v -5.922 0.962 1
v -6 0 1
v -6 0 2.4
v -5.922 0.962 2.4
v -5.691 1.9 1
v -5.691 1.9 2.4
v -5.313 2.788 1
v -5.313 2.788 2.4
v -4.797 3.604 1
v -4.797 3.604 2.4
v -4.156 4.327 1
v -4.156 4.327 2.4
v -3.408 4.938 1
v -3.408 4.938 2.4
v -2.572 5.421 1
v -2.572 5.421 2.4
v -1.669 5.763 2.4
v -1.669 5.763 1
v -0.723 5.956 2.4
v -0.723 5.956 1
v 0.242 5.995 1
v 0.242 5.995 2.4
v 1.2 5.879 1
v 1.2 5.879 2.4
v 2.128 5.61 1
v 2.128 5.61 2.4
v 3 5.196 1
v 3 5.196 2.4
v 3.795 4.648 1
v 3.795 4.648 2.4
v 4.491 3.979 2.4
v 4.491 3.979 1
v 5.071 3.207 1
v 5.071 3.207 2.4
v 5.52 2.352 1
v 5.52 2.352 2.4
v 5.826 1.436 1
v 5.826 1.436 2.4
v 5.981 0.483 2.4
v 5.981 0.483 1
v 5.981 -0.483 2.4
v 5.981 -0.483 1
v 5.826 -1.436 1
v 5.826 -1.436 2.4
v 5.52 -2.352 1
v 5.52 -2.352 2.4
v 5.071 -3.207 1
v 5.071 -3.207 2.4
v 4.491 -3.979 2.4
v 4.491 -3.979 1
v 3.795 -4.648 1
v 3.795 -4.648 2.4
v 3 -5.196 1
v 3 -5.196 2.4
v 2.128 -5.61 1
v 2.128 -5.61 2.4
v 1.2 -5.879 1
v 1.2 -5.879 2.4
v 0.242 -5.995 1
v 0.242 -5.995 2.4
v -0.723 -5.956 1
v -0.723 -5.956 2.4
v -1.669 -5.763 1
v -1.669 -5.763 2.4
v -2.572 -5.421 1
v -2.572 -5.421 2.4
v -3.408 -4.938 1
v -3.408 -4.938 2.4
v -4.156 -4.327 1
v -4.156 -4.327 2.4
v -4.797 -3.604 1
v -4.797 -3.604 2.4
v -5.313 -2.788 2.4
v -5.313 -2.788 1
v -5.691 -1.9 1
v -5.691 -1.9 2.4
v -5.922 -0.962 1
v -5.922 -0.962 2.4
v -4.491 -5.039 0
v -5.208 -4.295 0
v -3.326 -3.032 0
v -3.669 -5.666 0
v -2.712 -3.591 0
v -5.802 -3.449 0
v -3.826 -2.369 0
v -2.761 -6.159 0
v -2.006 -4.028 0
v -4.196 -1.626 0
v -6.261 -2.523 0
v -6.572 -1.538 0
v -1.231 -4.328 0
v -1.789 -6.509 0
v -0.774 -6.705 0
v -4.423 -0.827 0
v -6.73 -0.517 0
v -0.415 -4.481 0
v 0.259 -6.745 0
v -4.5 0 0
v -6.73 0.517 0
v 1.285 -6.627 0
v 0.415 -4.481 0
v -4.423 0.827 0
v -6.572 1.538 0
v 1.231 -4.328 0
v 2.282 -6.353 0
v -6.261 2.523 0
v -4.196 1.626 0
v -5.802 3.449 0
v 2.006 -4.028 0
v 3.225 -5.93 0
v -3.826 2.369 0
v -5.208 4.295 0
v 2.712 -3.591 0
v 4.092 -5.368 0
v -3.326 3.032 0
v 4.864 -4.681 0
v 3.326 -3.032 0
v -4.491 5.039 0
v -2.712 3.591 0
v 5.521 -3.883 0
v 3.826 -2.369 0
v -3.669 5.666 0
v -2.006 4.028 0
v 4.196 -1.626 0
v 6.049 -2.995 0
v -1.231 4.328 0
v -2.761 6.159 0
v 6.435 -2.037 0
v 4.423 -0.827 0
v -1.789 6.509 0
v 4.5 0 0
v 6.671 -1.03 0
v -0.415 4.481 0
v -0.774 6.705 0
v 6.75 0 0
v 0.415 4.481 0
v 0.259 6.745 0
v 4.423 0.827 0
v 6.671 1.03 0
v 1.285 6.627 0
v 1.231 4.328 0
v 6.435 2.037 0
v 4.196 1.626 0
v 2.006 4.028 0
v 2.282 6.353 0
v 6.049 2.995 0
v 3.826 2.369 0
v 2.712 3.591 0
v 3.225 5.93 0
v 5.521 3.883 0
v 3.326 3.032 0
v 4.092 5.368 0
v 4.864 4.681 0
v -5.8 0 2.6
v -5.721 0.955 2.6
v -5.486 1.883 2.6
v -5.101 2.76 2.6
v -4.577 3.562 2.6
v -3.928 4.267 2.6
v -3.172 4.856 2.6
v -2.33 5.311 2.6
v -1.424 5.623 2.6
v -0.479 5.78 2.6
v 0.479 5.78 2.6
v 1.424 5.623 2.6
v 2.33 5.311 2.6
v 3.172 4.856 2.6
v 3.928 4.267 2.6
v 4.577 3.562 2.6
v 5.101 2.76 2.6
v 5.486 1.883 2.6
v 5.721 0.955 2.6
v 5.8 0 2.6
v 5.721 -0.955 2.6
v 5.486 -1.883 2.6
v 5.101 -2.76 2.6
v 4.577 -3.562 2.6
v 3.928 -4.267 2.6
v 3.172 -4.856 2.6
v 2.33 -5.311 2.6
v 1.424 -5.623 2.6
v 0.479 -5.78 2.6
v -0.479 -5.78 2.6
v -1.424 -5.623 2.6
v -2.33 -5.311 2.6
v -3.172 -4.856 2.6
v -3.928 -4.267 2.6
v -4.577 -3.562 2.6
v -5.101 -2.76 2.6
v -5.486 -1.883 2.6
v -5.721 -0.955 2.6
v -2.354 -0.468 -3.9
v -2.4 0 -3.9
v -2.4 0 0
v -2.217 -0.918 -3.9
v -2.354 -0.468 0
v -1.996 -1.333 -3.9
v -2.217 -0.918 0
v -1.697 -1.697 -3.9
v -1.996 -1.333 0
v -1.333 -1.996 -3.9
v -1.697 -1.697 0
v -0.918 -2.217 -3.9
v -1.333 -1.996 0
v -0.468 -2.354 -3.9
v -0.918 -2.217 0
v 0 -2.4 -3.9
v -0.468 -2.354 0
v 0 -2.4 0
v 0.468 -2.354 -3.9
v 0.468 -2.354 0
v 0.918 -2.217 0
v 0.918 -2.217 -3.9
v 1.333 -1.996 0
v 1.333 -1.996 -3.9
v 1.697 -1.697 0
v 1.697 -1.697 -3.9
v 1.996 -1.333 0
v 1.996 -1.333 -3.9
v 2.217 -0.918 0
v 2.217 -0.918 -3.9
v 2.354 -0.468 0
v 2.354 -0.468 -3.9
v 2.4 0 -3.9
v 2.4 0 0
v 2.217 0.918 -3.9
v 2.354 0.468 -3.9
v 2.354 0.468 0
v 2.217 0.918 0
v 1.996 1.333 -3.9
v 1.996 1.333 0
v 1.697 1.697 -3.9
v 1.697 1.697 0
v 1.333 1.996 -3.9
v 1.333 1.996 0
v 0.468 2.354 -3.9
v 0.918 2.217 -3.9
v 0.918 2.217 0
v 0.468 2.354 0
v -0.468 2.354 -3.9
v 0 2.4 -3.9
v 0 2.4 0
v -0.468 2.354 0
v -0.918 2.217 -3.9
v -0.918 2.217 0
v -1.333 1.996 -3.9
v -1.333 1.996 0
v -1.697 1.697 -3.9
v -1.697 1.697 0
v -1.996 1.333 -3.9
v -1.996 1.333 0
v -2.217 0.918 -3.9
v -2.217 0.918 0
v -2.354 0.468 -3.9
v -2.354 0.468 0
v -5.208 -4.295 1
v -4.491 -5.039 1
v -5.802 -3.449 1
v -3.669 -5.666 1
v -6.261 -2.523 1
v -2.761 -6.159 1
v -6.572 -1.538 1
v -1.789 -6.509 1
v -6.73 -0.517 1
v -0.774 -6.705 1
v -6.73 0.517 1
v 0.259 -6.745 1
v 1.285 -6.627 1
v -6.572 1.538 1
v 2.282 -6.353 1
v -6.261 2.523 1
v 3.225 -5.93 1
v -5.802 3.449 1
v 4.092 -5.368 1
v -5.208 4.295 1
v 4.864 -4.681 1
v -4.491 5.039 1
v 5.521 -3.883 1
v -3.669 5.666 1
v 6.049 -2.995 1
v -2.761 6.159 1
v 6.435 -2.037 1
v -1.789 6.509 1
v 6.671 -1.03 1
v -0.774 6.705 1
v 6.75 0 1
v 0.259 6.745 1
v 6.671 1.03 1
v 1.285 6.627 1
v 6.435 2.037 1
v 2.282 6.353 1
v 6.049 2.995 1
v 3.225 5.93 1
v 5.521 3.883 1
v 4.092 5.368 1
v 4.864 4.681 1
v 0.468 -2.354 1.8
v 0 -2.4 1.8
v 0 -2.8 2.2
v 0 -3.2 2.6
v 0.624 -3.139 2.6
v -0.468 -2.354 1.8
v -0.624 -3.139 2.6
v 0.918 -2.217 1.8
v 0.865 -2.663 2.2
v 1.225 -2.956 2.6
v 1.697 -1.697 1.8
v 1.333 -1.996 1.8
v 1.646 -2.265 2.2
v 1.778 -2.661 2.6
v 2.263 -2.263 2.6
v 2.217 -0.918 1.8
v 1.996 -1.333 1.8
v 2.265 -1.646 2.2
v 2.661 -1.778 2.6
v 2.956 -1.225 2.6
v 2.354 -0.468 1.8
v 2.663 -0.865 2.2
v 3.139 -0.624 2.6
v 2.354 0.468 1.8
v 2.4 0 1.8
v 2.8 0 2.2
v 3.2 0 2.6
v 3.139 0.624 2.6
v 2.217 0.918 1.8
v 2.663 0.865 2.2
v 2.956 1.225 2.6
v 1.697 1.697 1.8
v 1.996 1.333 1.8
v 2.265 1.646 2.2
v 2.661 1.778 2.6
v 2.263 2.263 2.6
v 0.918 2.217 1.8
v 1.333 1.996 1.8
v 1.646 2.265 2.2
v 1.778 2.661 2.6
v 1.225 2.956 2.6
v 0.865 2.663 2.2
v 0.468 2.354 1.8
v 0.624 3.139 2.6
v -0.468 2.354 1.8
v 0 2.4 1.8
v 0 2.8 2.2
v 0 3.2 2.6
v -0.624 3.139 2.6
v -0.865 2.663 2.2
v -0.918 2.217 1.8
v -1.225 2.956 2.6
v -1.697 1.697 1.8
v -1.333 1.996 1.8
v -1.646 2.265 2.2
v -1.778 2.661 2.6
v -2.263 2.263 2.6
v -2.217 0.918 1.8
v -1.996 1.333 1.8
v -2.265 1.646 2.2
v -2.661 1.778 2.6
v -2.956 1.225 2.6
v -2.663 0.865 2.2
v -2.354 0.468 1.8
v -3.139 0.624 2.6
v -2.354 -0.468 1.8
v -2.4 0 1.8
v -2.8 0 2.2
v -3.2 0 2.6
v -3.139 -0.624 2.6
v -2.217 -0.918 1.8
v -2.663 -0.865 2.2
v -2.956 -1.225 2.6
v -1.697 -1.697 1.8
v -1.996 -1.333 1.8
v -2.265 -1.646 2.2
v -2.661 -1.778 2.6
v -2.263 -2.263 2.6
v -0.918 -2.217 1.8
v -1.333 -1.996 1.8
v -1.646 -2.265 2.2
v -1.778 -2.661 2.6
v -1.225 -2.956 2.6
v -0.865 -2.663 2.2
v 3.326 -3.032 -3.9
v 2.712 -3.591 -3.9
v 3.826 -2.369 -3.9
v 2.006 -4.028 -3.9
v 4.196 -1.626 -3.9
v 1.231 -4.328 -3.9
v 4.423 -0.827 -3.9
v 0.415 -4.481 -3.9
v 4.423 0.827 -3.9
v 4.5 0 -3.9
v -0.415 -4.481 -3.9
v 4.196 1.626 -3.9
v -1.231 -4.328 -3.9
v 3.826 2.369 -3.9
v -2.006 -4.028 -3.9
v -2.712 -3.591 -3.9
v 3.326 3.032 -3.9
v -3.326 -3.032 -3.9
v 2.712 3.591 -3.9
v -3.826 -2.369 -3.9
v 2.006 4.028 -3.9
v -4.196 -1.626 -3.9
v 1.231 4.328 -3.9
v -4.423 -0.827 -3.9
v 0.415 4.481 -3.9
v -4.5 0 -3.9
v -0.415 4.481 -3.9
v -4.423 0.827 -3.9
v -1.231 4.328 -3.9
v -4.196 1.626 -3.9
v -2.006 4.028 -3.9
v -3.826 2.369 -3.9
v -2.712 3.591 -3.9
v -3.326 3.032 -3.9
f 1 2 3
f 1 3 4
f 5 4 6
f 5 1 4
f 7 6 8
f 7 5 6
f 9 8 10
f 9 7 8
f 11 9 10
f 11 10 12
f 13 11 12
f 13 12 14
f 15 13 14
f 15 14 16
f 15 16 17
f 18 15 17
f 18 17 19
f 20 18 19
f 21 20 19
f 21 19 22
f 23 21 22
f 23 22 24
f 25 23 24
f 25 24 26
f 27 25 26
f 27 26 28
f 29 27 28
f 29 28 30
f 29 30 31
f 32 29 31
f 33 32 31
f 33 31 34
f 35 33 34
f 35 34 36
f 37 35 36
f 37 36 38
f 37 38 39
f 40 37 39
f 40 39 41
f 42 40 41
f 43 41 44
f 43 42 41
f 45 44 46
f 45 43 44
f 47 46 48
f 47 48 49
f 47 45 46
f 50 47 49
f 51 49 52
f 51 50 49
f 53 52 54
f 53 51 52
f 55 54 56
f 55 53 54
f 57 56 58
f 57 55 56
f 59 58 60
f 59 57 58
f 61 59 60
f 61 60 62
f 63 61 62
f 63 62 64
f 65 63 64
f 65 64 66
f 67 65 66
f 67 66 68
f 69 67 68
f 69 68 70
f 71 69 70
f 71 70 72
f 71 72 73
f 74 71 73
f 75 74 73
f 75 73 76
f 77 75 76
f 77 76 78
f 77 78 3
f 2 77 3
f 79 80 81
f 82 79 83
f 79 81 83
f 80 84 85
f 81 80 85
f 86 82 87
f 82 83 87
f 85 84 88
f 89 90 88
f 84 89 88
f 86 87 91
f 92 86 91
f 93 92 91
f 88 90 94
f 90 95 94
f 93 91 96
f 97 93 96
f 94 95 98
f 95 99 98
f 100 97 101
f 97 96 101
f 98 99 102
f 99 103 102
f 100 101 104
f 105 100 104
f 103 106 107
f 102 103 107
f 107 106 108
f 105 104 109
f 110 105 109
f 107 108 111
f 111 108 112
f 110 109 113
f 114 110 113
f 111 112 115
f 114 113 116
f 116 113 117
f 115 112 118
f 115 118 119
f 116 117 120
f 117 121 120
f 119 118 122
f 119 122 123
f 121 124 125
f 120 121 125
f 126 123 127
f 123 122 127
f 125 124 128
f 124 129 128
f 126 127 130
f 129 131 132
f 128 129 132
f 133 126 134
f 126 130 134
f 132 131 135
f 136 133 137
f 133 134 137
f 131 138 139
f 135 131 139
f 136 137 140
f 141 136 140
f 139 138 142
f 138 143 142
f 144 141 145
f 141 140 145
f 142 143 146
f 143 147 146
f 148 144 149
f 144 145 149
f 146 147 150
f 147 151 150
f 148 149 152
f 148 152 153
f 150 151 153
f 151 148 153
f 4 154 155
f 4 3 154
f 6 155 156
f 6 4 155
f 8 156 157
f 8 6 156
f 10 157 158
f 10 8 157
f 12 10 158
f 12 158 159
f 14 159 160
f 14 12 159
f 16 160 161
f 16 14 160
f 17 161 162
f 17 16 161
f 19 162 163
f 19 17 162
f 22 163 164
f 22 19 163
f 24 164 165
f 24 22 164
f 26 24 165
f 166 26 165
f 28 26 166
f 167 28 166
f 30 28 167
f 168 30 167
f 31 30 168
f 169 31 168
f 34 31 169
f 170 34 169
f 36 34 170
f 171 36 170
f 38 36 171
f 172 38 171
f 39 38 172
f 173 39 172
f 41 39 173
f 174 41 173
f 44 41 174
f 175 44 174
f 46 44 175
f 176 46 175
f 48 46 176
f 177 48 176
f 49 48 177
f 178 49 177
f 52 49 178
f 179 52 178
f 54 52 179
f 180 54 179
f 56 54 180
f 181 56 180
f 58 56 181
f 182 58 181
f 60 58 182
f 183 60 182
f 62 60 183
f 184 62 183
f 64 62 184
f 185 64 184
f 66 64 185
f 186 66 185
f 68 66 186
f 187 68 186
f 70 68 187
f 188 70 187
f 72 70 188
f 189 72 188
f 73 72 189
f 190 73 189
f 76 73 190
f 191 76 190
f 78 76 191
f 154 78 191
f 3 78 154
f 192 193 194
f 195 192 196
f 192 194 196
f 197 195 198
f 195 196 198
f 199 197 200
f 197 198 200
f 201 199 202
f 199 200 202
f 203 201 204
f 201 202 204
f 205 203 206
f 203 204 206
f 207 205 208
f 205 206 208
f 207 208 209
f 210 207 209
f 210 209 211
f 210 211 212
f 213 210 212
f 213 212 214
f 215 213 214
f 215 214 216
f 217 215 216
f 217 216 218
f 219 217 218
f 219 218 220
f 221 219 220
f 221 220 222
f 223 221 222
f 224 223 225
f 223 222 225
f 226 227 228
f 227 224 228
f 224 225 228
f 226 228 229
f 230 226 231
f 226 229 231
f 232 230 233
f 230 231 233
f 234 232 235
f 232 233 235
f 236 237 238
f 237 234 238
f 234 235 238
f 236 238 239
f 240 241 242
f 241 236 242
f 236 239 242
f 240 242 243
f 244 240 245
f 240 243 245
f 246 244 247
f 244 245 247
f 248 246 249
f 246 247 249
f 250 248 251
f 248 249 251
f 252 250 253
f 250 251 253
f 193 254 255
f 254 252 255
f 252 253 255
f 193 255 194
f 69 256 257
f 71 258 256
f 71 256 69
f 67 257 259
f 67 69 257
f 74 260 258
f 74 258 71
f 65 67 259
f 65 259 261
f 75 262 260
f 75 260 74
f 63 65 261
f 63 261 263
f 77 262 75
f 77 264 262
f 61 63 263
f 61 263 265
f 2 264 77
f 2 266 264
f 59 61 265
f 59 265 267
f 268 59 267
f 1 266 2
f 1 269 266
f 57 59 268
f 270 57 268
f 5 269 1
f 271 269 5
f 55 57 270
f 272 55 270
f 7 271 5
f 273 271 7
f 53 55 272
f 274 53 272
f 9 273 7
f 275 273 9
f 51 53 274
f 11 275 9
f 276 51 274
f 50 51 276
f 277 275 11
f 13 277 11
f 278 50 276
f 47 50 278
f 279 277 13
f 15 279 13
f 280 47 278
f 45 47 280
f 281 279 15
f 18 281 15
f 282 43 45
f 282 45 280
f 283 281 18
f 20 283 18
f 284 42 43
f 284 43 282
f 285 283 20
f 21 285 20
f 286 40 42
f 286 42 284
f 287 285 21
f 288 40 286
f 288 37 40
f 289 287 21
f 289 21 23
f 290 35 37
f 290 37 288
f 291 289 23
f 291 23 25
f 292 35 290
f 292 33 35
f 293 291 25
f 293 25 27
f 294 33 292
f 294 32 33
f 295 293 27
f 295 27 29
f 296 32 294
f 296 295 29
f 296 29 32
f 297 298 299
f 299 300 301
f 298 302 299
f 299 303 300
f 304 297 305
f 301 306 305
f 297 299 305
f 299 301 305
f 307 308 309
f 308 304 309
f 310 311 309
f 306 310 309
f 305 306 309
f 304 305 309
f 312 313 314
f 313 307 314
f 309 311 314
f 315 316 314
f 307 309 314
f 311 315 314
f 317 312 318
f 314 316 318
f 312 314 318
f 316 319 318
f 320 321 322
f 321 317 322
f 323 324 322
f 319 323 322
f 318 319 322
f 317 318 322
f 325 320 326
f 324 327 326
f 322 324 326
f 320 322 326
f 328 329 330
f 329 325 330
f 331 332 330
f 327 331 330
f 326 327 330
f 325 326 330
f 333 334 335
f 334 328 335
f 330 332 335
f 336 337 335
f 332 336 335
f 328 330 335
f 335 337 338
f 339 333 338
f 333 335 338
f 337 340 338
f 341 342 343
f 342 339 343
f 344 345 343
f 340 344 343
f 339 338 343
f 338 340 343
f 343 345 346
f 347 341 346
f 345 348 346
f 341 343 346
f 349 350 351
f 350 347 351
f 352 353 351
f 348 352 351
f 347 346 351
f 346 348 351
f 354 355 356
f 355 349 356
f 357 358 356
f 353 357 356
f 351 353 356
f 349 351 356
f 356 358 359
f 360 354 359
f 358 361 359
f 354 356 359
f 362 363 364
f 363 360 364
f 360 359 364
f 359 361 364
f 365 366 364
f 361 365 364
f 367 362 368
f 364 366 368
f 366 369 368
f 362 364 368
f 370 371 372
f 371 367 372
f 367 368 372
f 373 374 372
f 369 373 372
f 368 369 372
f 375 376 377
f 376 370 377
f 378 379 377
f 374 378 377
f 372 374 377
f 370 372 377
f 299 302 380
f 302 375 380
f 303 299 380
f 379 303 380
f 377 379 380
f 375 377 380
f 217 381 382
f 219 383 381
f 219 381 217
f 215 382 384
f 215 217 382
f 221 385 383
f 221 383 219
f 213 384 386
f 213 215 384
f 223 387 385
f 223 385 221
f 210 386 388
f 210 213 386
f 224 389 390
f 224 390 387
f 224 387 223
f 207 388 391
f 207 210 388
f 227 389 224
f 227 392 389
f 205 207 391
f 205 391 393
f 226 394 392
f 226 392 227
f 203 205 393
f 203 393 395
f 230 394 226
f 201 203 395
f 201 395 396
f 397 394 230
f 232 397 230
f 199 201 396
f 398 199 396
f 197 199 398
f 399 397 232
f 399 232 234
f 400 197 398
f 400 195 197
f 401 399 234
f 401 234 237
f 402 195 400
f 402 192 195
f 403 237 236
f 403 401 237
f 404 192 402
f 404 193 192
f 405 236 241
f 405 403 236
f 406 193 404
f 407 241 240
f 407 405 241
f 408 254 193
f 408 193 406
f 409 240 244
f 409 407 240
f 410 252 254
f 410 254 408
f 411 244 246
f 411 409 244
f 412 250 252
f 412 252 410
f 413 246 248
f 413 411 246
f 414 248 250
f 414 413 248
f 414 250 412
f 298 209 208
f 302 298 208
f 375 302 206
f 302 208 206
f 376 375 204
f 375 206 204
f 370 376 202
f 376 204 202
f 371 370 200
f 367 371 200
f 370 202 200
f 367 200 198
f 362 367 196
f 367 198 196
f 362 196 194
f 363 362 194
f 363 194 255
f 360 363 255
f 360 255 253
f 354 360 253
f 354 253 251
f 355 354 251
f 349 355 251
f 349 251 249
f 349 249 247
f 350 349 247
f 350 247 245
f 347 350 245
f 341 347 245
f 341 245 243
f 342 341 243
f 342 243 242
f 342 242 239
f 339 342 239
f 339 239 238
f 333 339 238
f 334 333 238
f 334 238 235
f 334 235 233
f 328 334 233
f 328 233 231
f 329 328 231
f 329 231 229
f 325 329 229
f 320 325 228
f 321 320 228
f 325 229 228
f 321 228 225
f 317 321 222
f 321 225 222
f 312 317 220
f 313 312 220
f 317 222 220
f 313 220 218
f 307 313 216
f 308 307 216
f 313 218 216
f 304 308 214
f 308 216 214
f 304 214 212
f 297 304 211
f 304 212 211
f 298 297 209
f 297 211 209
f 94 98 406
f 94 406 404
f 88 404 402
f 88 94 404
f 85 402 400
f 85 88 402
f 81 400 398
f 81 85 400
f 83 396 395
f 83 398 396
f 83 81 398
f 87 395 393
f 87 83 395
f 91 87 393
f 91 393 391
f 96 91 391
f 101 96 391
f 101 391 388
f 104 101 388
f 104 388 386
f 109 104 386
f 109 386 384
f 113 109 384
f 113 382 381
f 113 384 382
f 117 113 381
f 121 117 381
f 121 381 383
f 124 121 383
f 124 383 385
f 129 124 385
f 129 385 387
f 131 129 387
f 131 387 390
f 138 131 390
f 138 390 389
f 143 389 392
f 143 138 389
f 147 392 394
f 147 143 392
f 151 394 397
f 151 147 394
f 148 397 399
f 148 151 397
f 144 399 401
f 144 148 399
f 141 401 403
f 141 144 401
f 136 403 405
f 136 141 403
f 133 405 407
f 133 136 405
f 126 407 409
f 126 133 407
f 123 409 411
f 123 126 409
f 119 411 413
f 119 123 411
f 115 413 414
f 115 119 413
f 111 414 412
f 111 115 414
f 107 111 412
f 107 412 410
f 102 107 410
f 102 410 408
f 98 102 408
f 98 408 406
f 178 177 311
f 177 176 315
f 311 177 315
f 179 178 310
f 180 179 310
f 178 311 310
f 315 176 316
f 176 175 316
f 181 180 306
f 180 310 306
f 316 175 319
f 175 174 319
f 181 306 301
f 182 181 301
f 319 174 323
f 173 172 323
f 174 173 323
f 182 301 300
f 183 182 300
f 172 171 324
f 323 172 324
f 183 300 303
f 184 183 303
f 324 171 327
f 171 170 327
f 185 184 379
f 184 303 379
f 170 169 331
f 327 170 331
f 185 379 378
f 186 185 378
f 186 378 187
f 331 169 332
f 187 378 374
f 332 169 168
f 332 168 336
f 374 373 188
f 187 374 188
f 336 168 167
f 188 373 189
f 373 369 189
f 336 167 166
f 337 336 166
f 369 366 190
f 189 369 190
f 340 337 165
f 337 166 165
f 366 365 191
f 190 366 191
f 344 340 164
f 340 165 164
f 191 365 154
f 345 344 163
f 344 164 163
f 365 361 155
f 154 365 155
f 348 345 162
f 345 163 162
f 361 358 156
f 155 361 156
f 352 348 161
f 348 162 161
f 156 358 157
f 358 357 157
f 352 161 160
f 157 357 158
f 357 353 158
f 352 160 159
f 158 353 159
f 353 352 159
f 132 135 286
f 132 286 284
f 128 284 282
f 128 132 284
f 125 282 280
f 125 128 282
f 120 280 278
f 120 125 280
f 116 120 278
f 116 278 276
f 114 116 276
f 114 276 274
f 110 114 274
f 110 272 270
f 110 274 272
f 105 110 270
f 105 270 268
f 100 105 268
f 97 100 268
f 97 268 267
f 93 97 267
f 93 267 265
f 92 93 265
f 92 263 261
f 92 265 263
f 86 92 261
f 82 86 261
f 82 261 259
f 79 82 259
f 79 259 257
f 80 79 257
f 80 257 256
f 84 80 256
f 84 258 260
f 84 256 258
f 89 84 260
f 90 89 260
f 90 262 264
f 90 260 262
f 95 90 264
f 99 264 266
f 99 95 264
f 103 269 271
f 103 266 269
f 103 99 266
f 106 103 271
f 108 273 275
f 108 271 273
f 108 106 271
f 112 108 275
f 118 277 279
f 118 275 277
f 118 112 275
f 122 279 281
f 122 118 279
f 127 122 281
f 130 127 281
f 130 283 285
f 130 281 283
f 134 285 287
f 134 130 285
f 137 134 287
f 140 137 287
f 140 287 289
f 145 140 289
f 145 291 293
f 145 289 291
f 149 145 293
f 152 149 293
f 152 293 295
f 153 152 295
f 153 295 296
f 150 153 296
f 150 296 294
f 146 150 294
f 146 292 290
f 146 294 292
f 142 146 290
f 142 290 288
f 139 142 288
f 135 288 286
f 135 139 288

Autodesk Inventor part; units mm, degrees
ref_plane "YZ Plane" through (0, 0, 0) normal (1, 0, 0) x (0, 1, 0)
ref_plane "XZ Plane" through (0, 0, 0) normal (0, 1, 0) x (-1, 0, 0)
ref_plane "XY Plane" through (0, 0, 0) normal (0, 0, 1) x (1, 0, 0)
sketch "Sketch1" plane through (0, 0, 0) normal (0, 0, 1) x (1, 0, 0)
  circle A0 centre (0, 0) radius 6.75
  dimension "d0" = 13.5
extrude "Extrusion1" add sketch "Sketch1" along normal blind 1
sketch "Sketch2" plane through (0, 0, 1) normal (0, 0, 1) x (1, 0, 0)
  circle A0 centre (0, 0) radius 6.75 projected
  line L0 (-6.75, 6.75) -> (6.75, 6.75) construction
  line L1 (6.75, 6.75) -> (6.75, -6.75) construction
  line L2 (6.75, -6.75) -> (-6.75, -6.75) construction
  line L3 (-6.75, -6.75) -> (-6.75, 6.75) construction
  line L4 (-6.75, 6.75) -> (6.75, -6.75) construction
  dimension "d4" = 13.5
decal "Decal1"
sketch "Sketch3" plane through (0, 0, 0) normal (0, 0, -1) x (-1, 0, 0)
  circle A0 centre (0, 0) radius 6
  dimension "d6" = 12
extrude "Extrusion2" add sketch "Sketch3" against normal blind 2.6
hole "Hole1" at (0, 0, 2.6) direction (0, 0, -1) diameter 4.8 end through all
chamfer "Chamfer1" distance 0.8 angle 45 1 edges at (0, 2.4, 2.6)
chamfer "Chamfer2" distance 0.2 angle 45 1 edges at (6, 0, 2.6)
sketch "Sketch4" plane through (0, 0, 0) normal (0, 0, -1) x (-1, 0, 0)
  circle A0 centre (0, 0) radius 2.4 projected
  circle A1 centre (0, 0) radius 4.5
  circle A2 centre (0, 0) radius 2.4
  dimension "d24" = 9
extrude "Extrusion3" add sketch "Sketch4" along normal blind 3.9
properties part number "lens"
